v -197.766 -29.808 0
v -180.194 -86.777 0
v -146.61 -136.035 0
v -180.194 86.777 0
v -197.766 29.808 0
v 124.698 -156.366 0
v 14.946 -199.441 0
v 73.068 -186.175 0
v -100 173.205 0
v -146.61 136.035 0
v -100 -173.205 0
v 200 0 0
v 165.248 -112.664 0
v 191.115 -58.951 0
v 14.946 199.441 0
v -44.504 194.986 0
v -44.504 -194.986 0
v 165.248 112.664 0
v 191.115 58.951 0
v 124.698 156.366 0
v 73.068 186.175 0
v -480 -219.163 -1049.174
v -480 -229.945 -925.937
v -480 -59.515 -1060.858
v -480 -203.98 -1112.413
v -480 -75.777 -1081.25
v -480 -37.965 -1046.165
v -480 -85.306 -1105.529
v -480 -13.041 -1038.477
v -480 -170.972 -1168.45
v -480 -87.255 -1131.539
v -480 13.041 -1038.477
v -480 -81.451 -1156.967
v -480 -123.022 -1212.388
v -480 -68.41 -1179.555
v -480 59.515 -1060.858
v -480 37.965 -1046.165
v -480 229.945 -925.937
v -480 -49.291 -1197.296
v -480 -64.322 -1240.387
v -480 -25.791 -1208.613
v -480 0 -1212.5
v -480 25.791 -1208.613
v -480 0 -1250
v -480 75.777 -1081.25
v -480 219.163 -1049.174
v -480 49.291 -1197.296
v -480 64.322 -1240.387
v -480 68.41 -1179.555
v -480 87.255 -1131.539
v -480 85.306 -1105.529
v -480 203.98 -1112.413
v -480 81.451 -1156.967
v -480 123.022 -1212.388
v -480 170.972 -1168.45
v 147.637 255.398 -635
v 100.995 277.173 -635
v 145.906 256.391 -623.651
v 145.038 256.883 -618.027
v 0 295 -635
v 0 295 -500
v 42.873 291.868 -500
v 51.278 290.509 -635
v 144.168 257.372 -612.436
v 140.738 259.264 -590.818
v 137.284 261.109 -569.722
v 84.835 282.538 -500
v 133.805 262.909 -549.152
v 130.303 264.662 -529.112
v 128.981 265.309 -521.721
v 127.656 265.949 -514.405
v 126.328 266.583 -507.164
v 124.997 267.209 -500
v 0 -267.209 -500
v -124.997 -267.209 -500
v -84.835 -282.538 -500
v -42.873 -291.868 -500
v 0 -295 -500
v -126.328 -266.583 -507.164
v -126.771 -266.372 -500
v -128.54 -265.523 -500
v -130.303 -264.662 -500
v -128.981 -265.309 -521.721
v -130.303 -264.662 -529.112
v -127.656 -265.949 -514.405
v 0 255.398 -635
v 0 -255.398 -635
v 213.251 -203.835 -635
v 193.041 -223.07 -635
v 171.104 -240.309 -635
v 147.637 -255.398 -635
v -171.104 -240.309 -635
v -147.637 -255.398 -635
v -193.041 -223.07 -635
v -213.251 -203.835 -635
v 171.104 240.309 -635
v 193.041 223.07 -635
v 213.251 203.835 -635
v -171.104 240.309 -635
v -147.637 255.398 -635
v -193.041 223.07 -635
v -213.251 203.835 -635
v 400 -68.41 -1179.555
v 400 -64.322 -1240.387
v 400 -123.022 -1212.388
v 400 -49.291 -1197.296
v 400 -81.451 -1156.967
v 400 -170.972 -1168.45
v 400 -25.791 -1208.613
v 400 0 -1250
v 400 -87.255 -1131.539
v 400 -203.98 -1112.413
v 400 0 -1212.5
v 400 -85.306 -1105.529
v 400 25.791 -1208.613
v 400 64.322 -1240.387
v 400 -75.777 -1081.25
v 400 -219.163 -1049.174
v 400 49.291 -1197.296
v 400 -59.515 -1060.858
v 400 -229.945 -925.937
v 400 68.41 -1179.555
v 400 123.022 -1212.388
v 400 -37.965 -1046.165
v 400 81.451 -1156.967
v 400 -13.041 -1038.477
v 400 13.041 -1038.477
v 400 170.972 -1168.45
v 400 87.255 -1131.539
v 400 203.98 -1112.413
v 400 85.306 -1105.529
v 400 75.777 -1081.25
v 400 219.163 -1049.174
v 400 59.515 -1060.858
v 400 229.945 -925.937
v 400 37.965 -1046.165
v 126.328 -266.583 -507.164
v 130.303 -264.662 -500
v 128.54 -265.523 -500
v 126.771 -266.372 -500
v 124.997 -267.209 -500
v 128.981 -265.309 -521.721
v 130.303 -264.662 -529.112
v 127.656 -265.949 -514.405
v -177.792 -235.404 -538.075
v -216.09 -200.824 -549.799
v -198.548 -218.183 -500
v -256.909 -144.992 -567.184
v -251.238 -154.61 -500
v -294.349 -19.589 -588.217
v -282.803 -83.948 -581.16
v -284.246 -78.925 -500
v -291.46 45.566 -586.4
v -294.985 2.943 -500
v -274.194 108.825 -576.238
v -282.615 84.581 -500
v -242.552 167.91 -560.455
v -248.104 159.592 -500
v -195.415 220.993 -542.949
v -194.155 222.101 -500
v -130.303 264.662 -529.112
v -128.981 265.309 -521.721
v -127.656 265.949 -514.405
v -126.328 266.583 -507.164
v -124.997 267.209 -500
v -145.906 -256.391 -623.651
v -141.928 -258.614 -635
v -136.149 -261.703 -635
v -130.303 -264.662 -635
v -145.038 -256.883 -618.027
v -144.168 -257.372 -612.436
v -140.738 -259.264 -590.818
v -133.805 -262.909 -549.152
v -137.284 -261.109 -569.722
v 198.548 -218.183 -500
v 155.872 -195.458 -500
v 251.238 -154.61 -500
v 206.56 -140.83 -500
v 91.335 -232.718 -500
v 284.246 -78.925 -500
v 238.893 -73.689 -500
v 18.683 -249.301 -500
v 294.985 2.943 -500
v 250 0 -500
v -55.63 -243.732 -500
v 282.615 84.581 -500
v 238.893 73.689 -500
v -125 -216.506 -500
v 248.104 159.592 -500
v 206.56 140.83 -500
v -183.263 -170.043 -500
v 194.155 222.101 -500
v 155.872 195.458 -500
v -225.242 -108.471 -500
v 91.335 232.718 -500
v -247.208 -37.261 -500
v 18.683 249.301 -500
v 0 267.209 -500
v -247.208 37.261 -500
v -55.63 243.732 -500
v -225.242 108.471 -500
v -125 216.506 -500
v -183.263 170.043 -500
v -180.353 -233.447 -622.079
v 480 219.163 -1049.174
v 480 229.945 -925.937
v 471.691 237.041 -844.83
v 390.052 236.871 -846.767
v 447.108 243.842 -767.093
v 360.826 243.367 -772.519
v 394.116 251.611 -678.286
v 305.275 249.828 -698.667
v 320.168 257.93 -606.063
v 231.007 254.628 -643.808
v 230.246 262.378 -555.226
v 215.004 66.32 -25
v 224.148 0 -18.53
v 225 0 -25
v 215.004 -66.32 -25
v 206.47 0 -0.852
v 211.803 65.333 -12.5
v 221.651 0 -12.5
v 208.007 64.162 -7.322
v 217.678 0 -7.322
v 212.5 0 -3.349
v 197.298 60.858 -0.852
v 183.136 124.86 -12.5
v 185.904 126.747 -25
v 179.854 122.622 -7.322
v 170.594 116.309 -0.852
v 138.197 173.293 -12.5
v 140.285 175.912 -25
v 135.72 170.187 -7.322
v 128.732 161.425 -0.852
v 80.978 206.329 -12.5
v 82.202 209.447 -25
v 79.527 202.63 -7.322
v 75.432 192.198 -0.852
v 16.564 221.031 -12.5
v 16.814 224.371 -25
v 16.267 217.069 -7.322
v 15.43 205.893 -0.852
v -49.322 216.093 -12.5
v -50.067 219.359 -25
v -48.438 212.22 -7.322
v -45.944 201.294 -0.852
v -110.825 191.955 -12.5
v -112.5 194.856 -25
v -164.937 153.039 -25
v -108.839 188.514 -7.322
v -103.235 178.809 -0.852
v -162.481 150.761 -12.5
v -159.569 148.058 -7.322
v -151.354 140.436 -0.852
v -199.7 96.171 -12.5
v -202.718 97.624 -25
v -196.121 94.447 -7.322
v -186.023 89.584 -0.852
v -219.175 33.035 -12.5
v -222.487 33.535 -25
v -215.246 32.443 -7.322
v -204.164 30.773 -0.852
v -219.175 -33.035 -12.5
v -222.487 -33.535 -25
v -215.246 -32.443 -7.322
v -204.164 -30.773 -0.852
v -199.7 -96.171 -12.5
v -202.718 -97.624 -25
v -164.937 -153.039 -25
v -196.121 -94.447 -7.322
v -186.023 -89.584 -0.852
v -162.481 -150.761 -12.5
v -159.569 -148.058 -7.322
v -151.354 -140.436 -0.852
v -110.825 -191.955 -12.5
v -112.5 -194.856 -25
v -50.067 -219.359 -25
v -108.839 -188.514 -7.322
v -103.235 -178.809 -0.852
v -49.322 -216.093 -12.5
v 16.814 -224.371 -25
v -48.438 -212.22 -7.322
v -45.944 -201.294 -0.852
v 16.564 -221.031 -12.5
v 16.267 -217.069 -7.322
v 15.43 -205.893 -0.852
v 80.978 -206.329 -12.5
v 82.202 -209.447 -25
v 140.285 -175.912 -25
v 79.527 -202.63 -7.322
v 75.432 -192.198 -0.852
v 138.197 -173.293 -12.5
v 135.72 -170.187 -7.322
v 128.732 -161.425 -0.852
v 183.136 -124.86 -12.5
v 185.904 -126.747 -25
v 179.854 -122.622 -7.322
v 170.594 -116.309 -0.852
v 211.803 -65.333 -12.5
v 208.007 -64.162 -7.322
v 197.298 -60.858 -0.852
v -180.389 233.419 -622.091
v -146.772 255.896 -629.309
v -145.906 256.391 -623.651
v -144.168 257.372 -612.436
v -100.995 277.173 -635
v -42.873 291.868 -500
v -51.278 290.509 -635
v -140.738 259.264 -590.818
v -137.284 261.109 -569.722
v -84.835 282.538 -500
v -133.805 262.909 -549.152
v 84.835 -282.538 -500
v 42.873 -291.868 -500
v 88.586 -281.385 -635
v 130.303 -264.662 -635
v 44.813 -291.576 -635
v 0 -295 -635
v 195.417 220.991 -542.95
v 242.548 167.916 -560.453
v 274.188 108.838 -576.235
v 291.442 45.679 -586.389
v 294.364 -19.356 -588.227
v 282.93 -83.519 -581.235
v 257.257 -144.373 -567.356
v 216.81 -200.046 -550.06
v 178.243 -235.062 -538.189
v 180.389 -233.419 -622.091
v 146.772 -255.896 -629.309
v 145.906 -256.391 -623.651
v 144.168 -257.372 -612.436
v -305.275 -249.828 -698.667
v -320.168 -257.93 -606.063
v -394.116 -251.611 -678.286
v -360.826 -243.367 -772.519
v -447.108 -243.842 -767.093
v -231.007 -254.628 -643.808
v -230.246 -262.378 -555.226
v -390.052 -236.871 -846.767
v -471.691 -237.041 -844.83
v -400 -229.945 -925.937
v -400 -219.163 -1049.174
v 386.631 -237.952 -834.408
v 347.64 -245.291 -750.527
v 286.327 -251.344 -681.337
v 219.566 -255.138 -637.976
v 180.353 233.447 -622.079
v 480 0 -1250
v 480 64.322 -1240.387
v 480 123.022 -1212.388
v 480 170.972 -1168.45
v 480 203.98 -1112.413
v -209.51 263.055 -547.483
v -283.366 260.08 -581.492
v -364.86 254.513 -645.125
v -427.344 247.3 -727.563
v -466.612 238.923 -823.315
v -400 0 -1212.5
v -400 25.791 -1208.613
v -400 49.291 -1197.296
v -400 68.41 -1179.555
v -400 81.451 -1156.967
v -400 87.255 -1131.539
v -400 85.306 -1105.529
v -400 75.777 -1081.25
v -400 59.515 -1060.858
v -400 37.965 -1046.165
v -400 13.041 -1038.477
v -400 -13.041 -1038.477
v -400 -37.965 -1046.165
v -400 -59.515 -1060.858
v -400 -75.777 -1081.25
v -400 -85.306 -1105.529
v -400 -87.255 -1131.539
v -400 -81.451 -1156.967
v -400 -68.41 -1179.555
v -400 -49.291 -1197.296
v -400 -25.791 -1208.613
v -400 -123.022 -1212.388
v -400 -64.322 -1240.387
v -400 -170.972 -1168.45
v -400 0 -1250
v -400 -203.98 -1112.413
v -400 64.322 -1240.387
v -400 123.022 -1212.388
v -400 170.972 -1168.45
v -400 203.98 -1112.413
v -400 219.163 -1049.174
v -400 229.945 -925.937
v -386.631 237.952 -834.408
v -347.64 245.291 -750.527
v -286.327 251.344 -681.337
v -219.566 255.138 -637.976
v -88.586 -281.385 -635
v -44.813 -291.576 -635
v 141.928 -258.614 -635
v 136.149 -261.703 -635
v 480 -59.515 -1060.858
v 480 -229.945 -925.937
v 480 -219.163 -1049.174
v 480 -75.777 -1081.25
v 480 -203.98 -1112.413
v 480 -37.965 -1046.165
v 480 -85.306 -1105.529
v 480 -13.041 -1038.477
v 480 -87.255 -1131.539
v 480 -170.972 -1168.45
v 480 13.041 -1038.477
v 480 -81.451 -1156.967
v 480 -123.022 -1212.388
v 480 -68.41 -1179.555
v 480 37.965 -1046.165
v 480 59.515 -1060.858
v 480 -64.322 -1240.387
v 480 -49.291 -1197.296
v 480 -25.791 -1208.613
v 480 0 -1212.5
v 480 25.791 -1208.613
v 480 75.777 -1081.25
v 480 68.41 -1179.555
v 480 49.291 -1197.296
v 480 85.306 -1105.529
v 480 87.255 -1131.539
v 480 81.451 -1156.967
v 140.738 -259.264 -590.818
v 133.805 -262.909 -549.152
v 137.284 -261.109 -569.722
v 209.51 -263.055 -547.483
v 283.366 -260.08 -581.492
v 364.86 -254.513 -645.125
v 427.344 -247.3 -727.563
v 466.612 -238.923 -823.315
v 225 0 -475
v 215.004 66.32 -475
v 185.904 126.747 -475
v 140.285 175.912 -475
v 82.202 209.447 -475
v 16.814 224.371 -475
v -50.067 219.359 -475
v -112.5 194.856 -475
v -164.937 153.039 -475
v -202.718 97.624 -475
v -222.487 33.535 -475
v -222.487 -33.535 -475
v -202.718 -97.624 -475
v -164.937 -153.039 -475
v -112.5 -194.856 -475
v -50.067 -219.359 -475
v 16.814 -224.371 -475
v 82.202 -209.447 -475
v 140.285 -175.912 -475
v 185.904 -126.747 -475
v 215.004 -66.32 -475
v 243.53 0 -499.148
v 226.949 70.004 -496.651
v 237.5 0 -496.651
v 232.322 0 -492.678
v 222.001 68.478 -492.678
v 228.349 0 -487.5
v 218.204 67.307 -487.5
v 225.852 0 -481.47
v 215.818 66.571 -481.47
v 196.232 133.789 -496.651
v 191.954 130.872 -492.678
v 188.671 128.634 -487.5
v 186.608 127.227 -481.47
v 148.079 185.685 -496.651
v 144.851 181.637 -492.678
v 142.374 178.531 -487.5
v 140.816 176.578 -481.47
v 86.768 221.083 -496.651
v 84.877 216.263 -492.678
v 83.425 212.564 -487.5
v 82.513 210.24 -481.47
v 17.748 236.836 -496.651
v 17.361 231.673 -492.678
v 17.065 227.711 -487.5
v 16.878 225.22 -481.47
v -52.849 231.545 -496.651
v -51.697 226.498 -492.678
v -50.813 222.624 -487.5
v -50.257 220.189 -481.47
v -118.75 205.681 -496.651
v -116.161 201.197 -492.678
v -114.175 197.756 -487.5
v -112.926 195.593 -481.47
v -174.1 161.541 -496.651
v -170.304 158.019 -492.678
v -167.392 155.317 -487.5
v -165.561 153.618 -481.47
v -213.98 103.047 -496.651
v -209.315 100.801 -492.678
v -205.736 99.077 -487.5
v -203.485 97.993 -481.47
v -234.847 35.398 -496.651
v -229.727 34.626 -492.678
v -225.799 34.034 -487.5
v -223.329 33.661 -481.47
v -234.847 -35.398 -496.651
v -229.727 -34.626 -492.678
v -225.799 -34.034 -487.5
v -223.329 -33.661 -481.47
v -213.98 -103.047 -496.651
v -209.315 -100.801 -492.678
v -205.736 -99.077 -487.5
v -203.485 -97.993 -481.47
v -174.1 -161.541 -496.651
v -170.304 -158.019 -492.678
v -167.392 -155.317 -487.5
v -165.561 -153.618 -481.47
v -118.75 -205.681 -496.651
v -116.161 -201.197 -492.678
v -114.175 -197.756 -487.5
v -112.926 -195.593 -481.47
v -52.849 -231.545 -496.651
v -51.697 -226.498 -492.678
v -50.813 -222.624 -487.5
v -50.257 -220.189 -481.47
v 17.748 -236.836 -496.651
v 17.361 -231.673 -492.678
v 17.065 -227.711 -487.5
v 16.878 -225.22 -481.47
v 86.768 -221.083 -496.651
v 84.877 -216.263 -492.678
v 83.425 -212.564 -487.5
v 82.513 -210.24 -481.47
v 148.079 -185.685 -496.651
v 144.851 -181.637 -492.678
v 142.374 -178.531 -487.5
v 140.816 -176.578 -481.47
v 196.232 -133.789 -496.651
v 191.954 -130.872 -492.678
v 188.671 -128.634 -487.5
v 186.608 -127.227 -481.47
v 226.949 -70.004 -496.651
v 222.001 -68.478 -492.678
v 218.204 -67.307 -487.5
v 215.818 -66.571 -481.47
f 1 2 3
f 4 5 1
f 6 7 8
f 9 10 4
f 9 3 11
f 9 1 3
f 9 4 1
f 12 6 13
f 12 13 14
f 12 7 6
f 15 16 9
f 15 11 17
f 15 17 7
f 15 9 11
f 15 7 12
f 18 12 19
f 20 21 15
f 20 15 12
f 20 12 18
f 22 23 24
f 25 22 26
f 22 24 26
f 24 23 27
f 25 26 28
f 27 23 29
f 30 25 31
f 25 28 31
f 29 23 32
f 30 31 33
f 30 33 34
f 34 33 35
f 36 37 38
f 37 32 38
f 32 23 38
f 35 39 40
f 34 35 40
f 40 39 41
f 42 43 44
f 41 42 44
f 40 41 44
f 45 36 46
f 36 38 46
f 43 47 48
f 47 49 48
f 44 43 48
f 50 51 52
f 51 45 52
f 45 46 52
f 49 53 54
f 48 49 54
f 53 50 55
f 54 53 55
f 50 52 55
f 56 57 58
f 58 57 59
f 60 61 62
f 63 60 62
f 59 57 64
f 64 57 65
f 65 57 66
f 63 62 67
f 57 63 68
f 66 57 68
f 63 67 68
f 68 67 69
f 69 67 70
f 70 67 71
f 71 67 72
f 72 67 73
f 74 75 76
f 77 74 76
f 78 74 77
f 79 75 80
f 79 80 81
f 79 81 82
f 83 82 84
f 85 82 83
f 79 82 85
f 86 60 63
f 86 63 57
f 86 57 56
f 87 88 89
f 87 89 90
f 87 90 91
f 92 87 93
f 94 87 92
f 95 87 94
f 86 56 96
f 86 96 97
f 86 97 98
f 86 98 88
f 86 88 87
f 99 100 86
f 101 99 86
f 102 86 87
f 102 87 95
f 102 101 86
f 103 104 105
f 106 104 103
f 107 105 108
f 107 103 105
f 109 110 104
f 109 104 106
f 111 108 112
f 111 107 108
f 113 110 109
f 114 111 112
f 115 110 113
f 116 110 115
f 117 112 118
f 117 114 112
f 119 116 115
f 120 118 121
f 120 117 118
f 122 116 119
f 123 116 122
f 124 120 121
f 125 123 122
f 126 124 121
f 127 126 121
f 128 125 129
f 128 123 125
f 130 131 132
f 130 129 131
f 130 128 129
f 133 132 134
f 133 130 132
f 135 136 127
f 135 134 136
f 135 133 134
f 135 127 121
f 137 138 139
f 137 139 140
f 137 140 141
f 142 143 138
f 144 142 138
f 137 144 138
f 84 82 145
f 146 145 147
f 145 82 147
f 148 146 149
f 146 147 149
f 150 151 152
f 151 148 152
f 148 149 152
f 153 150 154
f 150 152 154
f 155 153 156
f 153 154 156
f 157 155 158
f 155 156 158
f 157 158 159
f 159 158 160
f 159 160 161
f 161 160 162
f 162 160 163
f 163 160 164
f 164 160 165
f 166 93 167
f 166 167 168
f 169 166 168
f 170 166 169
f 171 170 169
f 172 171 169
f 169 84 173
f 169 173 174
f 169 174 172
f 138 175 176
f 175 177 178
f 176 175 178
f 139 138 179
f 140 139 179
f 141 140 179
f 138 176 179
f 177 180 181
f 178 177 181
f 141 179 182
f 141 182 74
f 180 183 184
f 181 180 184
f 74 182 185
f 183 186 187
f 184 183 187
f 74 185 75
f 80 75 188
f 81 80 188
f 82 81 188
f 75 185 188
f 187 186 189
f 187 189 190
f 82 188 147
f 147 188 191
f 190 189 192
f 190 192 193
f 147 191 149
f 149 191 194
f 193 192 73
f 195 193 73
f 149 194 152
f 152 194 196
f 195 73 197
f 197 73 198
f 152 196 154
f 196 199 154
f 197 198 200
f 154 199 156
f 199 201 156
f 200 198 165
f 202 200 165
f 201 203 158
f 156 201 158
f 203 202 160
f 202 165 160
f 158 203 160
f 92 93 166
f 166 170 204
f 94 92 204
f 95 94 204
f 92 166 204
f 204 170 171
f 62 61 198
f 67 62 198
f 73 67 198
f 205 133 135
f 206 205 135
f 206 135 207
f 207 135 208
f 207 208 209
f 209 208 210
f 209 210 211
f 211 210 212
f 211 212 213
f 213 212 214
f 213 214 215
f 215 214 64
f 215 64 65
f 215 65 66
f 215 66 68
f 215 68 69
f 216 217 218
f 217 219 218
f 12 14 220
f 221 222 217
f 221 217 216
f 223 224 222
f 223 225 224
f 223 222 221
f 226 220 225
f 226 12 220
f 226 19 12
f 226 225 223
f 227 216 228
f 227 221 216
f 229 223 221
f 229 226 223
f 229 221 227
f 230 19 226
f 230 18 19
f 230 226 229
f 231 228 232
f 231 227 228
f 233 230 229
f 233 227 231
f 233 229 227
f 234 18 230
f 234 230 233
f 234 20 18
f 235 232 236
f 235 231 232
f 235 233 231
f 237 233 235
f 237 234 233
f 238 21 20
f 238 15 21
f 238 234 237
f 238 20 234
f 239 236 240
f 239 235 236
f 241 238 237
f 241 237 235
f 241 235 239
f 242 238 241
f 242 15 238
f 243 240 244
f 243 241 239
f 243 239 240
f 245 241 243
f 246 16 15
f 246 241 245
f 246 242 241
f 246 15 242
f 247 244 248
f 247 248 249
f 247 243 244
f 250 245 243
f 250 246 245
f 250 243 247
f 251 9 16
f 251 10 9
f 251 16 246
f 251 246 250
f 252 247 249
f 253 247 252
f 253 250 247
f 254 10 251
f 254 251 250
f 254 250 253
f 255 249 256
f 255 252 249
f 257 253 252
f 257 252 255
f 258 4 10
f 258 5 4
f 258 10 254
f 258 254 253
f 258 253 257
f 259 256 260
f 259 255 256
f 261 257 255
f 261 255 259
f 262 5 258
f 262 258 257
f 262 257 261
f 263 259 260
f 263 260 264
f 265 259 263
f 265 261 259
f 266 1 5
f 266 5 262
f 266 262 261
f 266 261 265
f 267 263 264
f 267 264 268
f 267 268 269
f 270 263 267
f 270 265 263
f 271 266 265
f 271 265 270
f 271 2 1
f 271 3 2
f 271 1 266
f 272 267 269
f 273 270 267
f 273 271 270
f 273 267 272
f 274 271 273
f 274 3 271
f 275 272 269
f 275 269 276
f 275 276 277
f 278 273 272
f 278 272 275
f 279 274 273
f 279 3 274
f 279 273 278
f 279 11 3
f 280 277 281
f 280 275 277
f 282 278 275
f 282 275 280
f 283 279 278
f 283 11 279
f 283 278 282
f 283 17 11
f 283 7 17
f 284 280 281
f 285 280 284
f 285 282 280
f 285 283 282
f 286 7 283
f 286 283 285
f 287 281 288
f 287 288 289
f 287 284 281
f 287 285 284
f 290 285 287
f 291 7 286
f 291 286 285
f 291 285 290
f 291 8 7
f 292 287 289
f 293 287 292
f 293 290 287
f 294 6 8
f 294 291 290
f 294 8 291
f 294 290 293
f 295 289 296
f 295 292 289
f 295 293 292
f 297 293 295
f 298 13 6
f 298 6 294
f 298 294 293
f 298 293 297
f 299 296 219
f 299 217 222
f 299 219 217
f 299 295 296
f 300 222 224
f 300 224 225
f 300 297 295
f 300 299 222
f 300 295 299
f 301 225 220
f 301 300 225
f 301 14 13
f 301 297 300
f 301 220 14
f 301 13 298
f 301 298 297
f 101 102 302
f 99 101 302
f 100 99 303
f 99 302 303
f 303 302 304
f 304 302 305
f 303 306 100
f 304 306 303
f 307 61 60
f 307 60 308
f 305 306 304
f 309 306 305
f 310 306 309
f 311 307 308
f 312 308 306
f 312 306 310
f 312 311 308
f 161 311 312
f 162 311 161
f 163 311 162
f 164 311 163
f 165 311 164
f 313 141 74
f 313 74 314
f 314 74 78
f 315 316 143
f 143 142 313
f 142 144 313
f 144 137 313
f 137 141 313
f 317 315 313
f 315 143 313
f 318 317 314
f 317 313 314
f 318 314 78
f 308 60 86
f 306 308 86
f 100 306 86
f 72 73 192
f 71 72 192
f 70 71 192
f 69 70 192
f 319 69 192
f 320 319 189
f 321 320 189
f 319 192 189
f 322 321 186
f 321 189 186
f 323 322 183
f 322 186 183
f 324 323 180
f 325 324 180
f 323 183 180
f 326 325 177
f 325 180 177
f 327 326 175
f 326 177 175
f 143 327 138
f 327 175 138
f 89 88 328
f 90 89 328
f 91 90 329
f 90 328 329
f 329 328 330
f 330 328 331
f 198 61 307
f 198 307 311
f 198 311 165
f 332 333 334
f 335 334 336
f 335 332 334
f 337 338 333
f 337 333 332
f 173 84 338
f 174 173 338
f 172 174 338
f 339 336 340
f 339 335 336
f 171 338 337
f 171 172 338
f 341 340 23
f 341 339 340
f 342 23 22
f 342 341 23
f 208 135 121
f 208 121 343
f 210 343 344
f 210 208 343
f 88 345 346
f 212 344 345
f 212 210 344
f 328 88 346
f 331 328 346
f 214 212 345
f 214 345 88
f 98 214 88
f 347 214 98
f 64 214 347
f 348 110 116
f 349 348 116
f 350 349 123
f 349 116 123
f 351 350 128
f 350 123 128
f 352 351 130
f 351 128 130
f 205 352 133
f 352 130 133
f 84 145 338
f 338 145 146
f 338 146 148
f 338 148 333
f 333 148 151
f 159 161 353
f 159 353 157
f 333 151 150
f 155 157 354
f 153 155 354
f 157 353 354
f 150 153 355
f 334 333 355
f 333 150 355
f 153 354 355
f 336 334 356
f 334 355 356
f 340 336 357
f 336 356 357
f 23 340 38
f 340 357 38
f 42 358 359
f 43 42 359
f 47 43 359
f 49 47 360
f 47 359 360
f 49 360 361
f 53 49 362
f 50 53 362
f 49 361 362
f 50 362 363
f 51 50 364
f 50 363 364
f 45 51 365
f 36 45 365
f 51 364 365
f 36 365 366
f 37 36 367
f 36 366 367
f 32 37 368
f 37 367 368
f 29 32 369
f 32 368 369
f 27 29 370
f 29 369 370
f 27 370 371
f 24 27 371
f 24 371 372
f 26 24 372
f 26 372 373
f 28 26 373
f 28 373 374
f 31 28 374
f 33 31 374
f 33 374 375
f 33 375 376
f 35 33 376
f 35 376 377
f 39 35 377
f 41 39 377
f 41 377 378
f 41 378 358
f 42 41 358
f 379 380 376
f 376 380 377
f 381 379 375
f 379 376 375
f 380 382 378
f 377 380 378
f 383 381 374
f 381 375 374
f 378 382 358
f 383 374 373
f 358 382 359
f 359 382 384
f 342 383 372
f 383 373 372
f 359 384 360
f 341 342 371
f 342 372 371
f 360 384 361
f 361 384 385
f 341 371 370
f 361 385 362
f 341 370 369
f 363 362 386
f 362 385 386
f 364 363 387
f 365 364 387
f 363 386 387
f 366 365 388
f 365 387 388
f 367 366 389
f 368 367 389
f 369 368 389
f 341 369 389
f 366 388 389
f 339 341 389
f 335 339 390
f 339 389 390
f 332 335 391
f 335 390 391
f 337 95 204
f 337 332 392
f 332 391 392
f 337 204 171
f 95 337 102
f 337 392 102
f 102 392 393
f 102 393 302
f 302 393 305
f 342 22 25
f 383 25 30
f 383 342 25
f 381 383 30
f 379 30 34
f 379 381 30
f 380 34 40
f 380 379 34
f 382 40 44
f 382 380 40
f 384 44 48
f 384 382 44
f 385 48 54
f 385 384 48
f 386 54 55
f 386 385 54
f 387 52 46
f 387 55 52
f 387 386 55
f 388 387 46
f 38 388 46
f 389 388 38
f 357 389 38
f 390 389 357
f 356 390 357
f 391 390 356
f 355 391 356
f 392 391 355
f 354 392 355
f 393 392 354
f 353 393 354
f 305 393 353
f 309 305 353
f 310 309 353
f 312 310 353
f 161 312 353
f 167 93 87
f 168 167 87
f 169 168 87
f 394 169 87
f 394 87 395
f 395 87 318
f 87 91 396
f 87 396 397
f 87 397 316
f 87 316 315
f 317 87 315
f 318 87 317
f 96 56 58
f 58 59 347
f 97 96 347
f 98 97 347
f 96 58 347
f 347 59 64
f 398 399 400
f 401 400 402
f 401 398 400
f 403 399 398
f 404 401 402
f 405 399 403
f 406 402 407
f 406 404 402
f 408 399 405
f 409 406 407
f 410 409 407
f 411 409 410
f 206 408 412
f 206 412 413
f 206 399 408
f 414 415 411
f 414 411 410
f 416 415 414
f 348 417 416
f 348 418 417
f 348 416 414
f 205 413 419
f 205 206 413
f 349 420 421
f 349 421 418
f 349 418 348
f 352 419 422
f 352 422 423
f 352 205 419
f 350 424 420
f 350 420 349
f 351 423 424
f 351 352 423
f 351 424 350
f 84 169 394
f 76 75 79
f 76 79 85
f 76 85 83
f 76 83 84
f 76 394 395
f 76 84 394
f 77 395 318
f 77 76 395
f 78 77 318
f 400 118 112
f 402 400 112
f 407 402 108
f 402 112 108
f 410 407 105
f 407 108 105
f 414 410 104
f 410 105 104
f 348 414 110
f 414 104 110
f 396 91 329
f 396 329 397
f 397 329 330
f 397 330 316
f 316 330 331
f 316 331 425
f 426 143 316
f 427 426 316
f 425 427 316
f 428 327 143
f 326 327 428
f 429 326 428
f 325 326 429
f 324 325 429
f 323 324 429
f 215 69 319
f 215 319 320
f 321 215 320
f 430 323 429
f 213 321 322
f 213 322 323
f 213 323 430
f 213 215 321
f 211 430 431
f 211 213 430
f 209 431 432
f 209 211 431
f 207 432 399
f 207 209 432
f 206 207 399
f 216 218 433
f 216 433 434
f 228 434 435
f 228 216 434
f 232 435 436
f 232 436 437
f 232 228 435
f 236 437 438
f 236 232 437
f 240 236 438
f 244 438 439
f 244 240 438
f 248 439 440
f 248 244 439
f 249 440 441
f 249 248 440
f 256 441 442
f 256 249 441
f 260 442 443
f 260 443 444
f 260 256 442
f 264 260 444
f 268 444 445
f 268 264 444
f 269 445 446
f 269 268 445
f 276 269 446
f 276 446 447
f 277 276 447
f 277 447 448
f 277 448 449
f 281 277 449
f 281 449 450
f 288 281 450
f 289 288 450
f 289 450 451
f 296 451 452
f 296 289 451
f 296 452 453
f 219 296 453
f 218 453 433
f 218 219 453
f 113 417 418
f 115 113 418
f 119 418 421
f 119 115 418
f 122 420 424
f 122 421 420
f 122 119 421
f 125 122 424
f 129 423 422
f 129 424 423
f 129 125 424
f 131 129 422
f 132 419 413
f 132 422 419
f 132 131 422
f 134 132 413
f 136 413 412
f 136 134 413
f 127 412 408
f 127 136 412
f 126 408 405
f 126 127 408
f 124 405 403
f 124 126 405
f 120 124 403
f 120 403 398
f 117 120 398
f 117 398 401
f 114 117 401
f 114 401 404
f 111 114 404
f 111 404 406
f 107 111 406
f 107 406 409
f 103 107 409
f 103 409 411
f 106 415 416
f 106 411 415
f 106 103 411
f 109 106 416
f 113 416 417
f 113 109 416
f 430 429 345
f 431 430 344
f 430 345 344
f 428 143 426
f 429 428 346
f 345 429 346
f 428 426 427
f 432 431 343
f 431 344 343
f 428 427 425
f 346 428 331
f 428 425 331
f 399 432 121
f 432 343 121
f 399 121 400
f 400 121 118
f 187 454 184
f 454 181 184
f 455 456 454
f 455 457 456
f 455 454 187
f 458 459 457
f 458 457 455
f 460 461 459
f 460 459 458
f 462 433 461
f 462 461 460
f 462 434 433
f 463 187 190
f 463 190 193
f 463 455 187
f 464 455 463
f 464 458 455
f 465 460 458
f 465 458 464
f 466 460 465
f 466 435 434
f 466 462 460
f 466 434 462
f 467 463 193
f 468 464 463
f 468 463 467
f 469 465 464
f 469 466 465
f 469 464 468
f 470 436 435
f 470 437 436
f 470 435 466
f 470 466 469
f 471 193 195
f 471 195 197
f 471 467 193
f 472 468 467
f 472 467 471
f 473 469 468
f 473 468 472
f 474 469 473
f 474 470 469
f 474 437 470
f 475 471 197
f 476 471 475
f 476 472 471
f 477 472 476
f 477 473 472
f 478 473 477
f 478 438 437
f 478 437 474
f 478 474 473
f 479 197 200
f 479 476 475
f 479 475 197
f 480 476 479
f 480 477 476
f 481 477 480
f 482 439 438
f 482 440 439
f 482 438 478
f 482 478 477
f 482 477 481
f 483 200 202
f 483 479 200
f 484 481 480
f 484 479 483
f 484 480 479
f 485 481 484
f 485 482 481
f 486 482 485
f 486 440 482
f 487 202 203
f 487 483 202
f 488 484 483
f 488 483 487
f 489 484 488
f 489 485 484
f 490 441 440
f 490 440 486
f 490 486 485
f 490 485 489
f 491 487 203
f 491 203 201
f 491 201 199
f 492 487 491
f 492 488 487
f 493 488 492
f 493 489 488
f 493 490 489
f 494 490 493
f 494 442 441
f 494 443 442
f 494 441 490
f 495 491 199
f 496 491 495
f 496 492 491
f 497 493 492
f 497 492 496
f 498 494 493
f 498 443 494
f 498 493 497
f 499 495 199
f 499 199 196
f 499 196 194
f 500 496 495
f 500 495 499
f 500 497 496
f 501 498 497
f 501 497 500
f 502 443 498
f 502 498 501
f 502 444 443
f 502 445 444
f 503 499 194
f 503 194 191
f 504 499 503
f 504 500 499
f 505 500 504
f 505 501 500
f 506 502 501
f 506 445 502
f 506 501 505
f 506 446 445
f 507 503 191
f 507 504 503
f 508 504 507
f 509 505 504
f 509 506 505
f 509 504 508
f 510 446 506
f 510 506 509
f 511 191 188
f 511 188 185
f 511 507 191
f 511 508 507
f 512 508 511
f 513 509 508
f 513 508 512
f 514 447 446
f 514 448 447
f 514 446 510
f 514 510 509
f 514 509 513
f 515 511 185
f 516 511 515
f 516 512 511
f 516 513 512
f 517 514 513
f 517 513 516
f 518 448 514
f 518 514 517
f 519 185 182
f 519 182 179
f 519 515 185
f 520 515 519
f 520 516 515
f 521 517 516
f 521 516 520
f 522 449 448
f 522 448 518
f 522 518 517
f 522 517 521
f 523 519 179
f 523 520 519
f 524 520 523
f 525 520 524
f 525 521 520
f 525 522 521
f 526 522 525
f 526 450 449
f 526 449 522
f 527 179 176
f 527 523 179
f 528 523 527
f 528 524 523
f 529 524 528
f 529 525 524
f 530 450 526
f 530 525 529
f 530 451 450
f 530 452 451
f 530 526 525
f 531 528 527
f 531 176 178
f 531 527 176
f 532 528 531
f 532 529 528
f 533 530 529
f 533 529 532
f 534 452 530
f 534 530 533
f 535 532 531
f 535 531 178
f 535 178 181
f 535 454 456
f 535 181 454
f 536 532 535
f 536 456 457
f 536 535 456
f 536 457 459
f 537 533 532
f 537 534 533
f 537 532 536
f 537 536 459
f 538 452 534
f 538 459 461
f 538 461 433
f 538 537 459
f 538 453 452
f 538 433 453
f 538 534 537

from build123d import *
from build123d.topology import SkipClean

# Parameters (mm, degrees)
SKETCH1_R           = 225
BOSS_EXTRUDE1_DEPTH = 500
SKETCH2_R           = 295
BOSS_EXTRUDE2_DEPTH = 135
FILLET1_R           = 25
BOSS_EXTRUDE3_DEPTH = 274
SKETCH7_R           = 87.5
CUT_EXTRUDE1_DEPTH  = 548
SKETCH8_R           = 295
BOSS_EXTRUDE4_DEPTH = 135


with BuildPart() as part:
    # Sketch1 → Boss-Extrude1 (new body)
    with BuildSketch(Plane.XY):
        Circle(SKETCH1_R)
    extrude(amount=-BOSS_EXTRUDE1_DEPTH)

    # Sketch2 → Boss-Extrude2 (add)
    with BuildSketch(Plane(origin=(0, 0, -500), x_dir=(-1, 0, 0), z_dir=(0, 0, -1))):
        Circle(SKETCH2_R)
    extrude(amount=BOSS_EXTRUDE2_DEPTH)

    # Fillet1
    fillet1_edges = [part.edges().sort_by_distance(p)[0] for p in [
        (-225, 0, 0),
        (-225, 0, -500),
    ]]
    fillet(fillet1_edges, radius=FILLET1_R)

    # Sketch5 → Boss-Extrude3 (add, symmetric)
    with BuildSketch(Plane(origin=(0, 0, 0), x_dir=(1, 0, 0), z_dir=(0, 1, 0))):
        with BuildLine():
            Line((0, 525.936531369), (-80, 525.936531369))
            ThreePointArc((-80, 525.936531369), (-362.842712475, 643.093818894), (-480, 925.936531369))
            Line((-480, 925.936531369), (-480, 1250))
            Line((-480, 1250), (-400, 1250))
            Line((-400, 1250), (-400, 925.936531369))
            ThreePointArc((-400, 925.936531369), (-306.27416998, 699.662361389), (-80, 605.936531369))
            Line((-80, 605.936531369), (0, 605.936531369))
            Line((0, 605.936531369), (0, 525.936531369))
        make_face()
    boss_extrude3 = extrude(amount=BOSS_EXTRUDE3_DEPTH, both=True)

    # Sketch7 → Cut-Extrude1 (cut)
    with BuildSketch(Plane(origin=(0, 0, 0), x_dir=(0, 0, -1), z_dir=(1, 0, 0))):
        with Locations((1125, 0)):
            Circle(SKETCH7_R)
        with BuildLine():
            Line((1049.174263404, 219.16283358), (203.039318936, 293.190049034))
            Line((203.039318936, 293.190049034), (290.021270447, 513.829798209))
            Line((290.021270447, 513.829798209), (1323.371387979, 627.428253954))
            Line((1323.371387979, 627.428253954), (2049.606507286, -712.594868551))
            Line((2049.606507286, -712.594868551), (1049.174263404, -1026.824287114))
            Line((1049.174263404, -1026.824287114), (203.039318936, -293.190049034))
            Line((203.039318936, -293.190049034), (1049.174263404, -219.16283358))
            ThreePointArc((1049.174263404, -219.16283358), (1250, 0), (1049.174263404, 219.16283358))
        make_face()
    cut_extrude1 = extrude(amount=-CUT_EXTRUDE1_DEPTH, mode=Mode.SUBTRACT)

    # Sketch8 → Boss-Extrude4 (add)
    with BuildSketch(Plane.XY.offset(-500)):
        with Locations(Location((0, 0, 0), (0, 0, 243.787314881))):
            Circle(SKETCH8_R)
    boss_extrude4 = extrude(amount=-BOSS_EXTRUDE4_DEPTH)

    # Mirror3: Boss-Extrude3, Cut-Extrude1, Boss-Extrude4 across plane
    with SkipClean():  # the faces are left unmerged after this step: merging them gives an invalid solid
        add(boss_extrude3.mirror(Plane(origin=(0, 0, 0), x_dir=(0, 0, 1), z_dir=(1, 0, 0))))
        add(cut_extrude1.mirror(Plane(origin=(0, 0, 0), x_dir=(0, 0, 1), z_dir=(1, 0, 0))), mode=Mode.SUBTRACT)
        add(boss_extrude4.mirror(Plane(origin=(0, 0, 0), x_dir=(0, 0, 1), z_dir=(1, 0, 0))))
    add(part.part.scale(1), mode=Mode.REPLACE)  # the faces are merged on a copy


solid = part.part
